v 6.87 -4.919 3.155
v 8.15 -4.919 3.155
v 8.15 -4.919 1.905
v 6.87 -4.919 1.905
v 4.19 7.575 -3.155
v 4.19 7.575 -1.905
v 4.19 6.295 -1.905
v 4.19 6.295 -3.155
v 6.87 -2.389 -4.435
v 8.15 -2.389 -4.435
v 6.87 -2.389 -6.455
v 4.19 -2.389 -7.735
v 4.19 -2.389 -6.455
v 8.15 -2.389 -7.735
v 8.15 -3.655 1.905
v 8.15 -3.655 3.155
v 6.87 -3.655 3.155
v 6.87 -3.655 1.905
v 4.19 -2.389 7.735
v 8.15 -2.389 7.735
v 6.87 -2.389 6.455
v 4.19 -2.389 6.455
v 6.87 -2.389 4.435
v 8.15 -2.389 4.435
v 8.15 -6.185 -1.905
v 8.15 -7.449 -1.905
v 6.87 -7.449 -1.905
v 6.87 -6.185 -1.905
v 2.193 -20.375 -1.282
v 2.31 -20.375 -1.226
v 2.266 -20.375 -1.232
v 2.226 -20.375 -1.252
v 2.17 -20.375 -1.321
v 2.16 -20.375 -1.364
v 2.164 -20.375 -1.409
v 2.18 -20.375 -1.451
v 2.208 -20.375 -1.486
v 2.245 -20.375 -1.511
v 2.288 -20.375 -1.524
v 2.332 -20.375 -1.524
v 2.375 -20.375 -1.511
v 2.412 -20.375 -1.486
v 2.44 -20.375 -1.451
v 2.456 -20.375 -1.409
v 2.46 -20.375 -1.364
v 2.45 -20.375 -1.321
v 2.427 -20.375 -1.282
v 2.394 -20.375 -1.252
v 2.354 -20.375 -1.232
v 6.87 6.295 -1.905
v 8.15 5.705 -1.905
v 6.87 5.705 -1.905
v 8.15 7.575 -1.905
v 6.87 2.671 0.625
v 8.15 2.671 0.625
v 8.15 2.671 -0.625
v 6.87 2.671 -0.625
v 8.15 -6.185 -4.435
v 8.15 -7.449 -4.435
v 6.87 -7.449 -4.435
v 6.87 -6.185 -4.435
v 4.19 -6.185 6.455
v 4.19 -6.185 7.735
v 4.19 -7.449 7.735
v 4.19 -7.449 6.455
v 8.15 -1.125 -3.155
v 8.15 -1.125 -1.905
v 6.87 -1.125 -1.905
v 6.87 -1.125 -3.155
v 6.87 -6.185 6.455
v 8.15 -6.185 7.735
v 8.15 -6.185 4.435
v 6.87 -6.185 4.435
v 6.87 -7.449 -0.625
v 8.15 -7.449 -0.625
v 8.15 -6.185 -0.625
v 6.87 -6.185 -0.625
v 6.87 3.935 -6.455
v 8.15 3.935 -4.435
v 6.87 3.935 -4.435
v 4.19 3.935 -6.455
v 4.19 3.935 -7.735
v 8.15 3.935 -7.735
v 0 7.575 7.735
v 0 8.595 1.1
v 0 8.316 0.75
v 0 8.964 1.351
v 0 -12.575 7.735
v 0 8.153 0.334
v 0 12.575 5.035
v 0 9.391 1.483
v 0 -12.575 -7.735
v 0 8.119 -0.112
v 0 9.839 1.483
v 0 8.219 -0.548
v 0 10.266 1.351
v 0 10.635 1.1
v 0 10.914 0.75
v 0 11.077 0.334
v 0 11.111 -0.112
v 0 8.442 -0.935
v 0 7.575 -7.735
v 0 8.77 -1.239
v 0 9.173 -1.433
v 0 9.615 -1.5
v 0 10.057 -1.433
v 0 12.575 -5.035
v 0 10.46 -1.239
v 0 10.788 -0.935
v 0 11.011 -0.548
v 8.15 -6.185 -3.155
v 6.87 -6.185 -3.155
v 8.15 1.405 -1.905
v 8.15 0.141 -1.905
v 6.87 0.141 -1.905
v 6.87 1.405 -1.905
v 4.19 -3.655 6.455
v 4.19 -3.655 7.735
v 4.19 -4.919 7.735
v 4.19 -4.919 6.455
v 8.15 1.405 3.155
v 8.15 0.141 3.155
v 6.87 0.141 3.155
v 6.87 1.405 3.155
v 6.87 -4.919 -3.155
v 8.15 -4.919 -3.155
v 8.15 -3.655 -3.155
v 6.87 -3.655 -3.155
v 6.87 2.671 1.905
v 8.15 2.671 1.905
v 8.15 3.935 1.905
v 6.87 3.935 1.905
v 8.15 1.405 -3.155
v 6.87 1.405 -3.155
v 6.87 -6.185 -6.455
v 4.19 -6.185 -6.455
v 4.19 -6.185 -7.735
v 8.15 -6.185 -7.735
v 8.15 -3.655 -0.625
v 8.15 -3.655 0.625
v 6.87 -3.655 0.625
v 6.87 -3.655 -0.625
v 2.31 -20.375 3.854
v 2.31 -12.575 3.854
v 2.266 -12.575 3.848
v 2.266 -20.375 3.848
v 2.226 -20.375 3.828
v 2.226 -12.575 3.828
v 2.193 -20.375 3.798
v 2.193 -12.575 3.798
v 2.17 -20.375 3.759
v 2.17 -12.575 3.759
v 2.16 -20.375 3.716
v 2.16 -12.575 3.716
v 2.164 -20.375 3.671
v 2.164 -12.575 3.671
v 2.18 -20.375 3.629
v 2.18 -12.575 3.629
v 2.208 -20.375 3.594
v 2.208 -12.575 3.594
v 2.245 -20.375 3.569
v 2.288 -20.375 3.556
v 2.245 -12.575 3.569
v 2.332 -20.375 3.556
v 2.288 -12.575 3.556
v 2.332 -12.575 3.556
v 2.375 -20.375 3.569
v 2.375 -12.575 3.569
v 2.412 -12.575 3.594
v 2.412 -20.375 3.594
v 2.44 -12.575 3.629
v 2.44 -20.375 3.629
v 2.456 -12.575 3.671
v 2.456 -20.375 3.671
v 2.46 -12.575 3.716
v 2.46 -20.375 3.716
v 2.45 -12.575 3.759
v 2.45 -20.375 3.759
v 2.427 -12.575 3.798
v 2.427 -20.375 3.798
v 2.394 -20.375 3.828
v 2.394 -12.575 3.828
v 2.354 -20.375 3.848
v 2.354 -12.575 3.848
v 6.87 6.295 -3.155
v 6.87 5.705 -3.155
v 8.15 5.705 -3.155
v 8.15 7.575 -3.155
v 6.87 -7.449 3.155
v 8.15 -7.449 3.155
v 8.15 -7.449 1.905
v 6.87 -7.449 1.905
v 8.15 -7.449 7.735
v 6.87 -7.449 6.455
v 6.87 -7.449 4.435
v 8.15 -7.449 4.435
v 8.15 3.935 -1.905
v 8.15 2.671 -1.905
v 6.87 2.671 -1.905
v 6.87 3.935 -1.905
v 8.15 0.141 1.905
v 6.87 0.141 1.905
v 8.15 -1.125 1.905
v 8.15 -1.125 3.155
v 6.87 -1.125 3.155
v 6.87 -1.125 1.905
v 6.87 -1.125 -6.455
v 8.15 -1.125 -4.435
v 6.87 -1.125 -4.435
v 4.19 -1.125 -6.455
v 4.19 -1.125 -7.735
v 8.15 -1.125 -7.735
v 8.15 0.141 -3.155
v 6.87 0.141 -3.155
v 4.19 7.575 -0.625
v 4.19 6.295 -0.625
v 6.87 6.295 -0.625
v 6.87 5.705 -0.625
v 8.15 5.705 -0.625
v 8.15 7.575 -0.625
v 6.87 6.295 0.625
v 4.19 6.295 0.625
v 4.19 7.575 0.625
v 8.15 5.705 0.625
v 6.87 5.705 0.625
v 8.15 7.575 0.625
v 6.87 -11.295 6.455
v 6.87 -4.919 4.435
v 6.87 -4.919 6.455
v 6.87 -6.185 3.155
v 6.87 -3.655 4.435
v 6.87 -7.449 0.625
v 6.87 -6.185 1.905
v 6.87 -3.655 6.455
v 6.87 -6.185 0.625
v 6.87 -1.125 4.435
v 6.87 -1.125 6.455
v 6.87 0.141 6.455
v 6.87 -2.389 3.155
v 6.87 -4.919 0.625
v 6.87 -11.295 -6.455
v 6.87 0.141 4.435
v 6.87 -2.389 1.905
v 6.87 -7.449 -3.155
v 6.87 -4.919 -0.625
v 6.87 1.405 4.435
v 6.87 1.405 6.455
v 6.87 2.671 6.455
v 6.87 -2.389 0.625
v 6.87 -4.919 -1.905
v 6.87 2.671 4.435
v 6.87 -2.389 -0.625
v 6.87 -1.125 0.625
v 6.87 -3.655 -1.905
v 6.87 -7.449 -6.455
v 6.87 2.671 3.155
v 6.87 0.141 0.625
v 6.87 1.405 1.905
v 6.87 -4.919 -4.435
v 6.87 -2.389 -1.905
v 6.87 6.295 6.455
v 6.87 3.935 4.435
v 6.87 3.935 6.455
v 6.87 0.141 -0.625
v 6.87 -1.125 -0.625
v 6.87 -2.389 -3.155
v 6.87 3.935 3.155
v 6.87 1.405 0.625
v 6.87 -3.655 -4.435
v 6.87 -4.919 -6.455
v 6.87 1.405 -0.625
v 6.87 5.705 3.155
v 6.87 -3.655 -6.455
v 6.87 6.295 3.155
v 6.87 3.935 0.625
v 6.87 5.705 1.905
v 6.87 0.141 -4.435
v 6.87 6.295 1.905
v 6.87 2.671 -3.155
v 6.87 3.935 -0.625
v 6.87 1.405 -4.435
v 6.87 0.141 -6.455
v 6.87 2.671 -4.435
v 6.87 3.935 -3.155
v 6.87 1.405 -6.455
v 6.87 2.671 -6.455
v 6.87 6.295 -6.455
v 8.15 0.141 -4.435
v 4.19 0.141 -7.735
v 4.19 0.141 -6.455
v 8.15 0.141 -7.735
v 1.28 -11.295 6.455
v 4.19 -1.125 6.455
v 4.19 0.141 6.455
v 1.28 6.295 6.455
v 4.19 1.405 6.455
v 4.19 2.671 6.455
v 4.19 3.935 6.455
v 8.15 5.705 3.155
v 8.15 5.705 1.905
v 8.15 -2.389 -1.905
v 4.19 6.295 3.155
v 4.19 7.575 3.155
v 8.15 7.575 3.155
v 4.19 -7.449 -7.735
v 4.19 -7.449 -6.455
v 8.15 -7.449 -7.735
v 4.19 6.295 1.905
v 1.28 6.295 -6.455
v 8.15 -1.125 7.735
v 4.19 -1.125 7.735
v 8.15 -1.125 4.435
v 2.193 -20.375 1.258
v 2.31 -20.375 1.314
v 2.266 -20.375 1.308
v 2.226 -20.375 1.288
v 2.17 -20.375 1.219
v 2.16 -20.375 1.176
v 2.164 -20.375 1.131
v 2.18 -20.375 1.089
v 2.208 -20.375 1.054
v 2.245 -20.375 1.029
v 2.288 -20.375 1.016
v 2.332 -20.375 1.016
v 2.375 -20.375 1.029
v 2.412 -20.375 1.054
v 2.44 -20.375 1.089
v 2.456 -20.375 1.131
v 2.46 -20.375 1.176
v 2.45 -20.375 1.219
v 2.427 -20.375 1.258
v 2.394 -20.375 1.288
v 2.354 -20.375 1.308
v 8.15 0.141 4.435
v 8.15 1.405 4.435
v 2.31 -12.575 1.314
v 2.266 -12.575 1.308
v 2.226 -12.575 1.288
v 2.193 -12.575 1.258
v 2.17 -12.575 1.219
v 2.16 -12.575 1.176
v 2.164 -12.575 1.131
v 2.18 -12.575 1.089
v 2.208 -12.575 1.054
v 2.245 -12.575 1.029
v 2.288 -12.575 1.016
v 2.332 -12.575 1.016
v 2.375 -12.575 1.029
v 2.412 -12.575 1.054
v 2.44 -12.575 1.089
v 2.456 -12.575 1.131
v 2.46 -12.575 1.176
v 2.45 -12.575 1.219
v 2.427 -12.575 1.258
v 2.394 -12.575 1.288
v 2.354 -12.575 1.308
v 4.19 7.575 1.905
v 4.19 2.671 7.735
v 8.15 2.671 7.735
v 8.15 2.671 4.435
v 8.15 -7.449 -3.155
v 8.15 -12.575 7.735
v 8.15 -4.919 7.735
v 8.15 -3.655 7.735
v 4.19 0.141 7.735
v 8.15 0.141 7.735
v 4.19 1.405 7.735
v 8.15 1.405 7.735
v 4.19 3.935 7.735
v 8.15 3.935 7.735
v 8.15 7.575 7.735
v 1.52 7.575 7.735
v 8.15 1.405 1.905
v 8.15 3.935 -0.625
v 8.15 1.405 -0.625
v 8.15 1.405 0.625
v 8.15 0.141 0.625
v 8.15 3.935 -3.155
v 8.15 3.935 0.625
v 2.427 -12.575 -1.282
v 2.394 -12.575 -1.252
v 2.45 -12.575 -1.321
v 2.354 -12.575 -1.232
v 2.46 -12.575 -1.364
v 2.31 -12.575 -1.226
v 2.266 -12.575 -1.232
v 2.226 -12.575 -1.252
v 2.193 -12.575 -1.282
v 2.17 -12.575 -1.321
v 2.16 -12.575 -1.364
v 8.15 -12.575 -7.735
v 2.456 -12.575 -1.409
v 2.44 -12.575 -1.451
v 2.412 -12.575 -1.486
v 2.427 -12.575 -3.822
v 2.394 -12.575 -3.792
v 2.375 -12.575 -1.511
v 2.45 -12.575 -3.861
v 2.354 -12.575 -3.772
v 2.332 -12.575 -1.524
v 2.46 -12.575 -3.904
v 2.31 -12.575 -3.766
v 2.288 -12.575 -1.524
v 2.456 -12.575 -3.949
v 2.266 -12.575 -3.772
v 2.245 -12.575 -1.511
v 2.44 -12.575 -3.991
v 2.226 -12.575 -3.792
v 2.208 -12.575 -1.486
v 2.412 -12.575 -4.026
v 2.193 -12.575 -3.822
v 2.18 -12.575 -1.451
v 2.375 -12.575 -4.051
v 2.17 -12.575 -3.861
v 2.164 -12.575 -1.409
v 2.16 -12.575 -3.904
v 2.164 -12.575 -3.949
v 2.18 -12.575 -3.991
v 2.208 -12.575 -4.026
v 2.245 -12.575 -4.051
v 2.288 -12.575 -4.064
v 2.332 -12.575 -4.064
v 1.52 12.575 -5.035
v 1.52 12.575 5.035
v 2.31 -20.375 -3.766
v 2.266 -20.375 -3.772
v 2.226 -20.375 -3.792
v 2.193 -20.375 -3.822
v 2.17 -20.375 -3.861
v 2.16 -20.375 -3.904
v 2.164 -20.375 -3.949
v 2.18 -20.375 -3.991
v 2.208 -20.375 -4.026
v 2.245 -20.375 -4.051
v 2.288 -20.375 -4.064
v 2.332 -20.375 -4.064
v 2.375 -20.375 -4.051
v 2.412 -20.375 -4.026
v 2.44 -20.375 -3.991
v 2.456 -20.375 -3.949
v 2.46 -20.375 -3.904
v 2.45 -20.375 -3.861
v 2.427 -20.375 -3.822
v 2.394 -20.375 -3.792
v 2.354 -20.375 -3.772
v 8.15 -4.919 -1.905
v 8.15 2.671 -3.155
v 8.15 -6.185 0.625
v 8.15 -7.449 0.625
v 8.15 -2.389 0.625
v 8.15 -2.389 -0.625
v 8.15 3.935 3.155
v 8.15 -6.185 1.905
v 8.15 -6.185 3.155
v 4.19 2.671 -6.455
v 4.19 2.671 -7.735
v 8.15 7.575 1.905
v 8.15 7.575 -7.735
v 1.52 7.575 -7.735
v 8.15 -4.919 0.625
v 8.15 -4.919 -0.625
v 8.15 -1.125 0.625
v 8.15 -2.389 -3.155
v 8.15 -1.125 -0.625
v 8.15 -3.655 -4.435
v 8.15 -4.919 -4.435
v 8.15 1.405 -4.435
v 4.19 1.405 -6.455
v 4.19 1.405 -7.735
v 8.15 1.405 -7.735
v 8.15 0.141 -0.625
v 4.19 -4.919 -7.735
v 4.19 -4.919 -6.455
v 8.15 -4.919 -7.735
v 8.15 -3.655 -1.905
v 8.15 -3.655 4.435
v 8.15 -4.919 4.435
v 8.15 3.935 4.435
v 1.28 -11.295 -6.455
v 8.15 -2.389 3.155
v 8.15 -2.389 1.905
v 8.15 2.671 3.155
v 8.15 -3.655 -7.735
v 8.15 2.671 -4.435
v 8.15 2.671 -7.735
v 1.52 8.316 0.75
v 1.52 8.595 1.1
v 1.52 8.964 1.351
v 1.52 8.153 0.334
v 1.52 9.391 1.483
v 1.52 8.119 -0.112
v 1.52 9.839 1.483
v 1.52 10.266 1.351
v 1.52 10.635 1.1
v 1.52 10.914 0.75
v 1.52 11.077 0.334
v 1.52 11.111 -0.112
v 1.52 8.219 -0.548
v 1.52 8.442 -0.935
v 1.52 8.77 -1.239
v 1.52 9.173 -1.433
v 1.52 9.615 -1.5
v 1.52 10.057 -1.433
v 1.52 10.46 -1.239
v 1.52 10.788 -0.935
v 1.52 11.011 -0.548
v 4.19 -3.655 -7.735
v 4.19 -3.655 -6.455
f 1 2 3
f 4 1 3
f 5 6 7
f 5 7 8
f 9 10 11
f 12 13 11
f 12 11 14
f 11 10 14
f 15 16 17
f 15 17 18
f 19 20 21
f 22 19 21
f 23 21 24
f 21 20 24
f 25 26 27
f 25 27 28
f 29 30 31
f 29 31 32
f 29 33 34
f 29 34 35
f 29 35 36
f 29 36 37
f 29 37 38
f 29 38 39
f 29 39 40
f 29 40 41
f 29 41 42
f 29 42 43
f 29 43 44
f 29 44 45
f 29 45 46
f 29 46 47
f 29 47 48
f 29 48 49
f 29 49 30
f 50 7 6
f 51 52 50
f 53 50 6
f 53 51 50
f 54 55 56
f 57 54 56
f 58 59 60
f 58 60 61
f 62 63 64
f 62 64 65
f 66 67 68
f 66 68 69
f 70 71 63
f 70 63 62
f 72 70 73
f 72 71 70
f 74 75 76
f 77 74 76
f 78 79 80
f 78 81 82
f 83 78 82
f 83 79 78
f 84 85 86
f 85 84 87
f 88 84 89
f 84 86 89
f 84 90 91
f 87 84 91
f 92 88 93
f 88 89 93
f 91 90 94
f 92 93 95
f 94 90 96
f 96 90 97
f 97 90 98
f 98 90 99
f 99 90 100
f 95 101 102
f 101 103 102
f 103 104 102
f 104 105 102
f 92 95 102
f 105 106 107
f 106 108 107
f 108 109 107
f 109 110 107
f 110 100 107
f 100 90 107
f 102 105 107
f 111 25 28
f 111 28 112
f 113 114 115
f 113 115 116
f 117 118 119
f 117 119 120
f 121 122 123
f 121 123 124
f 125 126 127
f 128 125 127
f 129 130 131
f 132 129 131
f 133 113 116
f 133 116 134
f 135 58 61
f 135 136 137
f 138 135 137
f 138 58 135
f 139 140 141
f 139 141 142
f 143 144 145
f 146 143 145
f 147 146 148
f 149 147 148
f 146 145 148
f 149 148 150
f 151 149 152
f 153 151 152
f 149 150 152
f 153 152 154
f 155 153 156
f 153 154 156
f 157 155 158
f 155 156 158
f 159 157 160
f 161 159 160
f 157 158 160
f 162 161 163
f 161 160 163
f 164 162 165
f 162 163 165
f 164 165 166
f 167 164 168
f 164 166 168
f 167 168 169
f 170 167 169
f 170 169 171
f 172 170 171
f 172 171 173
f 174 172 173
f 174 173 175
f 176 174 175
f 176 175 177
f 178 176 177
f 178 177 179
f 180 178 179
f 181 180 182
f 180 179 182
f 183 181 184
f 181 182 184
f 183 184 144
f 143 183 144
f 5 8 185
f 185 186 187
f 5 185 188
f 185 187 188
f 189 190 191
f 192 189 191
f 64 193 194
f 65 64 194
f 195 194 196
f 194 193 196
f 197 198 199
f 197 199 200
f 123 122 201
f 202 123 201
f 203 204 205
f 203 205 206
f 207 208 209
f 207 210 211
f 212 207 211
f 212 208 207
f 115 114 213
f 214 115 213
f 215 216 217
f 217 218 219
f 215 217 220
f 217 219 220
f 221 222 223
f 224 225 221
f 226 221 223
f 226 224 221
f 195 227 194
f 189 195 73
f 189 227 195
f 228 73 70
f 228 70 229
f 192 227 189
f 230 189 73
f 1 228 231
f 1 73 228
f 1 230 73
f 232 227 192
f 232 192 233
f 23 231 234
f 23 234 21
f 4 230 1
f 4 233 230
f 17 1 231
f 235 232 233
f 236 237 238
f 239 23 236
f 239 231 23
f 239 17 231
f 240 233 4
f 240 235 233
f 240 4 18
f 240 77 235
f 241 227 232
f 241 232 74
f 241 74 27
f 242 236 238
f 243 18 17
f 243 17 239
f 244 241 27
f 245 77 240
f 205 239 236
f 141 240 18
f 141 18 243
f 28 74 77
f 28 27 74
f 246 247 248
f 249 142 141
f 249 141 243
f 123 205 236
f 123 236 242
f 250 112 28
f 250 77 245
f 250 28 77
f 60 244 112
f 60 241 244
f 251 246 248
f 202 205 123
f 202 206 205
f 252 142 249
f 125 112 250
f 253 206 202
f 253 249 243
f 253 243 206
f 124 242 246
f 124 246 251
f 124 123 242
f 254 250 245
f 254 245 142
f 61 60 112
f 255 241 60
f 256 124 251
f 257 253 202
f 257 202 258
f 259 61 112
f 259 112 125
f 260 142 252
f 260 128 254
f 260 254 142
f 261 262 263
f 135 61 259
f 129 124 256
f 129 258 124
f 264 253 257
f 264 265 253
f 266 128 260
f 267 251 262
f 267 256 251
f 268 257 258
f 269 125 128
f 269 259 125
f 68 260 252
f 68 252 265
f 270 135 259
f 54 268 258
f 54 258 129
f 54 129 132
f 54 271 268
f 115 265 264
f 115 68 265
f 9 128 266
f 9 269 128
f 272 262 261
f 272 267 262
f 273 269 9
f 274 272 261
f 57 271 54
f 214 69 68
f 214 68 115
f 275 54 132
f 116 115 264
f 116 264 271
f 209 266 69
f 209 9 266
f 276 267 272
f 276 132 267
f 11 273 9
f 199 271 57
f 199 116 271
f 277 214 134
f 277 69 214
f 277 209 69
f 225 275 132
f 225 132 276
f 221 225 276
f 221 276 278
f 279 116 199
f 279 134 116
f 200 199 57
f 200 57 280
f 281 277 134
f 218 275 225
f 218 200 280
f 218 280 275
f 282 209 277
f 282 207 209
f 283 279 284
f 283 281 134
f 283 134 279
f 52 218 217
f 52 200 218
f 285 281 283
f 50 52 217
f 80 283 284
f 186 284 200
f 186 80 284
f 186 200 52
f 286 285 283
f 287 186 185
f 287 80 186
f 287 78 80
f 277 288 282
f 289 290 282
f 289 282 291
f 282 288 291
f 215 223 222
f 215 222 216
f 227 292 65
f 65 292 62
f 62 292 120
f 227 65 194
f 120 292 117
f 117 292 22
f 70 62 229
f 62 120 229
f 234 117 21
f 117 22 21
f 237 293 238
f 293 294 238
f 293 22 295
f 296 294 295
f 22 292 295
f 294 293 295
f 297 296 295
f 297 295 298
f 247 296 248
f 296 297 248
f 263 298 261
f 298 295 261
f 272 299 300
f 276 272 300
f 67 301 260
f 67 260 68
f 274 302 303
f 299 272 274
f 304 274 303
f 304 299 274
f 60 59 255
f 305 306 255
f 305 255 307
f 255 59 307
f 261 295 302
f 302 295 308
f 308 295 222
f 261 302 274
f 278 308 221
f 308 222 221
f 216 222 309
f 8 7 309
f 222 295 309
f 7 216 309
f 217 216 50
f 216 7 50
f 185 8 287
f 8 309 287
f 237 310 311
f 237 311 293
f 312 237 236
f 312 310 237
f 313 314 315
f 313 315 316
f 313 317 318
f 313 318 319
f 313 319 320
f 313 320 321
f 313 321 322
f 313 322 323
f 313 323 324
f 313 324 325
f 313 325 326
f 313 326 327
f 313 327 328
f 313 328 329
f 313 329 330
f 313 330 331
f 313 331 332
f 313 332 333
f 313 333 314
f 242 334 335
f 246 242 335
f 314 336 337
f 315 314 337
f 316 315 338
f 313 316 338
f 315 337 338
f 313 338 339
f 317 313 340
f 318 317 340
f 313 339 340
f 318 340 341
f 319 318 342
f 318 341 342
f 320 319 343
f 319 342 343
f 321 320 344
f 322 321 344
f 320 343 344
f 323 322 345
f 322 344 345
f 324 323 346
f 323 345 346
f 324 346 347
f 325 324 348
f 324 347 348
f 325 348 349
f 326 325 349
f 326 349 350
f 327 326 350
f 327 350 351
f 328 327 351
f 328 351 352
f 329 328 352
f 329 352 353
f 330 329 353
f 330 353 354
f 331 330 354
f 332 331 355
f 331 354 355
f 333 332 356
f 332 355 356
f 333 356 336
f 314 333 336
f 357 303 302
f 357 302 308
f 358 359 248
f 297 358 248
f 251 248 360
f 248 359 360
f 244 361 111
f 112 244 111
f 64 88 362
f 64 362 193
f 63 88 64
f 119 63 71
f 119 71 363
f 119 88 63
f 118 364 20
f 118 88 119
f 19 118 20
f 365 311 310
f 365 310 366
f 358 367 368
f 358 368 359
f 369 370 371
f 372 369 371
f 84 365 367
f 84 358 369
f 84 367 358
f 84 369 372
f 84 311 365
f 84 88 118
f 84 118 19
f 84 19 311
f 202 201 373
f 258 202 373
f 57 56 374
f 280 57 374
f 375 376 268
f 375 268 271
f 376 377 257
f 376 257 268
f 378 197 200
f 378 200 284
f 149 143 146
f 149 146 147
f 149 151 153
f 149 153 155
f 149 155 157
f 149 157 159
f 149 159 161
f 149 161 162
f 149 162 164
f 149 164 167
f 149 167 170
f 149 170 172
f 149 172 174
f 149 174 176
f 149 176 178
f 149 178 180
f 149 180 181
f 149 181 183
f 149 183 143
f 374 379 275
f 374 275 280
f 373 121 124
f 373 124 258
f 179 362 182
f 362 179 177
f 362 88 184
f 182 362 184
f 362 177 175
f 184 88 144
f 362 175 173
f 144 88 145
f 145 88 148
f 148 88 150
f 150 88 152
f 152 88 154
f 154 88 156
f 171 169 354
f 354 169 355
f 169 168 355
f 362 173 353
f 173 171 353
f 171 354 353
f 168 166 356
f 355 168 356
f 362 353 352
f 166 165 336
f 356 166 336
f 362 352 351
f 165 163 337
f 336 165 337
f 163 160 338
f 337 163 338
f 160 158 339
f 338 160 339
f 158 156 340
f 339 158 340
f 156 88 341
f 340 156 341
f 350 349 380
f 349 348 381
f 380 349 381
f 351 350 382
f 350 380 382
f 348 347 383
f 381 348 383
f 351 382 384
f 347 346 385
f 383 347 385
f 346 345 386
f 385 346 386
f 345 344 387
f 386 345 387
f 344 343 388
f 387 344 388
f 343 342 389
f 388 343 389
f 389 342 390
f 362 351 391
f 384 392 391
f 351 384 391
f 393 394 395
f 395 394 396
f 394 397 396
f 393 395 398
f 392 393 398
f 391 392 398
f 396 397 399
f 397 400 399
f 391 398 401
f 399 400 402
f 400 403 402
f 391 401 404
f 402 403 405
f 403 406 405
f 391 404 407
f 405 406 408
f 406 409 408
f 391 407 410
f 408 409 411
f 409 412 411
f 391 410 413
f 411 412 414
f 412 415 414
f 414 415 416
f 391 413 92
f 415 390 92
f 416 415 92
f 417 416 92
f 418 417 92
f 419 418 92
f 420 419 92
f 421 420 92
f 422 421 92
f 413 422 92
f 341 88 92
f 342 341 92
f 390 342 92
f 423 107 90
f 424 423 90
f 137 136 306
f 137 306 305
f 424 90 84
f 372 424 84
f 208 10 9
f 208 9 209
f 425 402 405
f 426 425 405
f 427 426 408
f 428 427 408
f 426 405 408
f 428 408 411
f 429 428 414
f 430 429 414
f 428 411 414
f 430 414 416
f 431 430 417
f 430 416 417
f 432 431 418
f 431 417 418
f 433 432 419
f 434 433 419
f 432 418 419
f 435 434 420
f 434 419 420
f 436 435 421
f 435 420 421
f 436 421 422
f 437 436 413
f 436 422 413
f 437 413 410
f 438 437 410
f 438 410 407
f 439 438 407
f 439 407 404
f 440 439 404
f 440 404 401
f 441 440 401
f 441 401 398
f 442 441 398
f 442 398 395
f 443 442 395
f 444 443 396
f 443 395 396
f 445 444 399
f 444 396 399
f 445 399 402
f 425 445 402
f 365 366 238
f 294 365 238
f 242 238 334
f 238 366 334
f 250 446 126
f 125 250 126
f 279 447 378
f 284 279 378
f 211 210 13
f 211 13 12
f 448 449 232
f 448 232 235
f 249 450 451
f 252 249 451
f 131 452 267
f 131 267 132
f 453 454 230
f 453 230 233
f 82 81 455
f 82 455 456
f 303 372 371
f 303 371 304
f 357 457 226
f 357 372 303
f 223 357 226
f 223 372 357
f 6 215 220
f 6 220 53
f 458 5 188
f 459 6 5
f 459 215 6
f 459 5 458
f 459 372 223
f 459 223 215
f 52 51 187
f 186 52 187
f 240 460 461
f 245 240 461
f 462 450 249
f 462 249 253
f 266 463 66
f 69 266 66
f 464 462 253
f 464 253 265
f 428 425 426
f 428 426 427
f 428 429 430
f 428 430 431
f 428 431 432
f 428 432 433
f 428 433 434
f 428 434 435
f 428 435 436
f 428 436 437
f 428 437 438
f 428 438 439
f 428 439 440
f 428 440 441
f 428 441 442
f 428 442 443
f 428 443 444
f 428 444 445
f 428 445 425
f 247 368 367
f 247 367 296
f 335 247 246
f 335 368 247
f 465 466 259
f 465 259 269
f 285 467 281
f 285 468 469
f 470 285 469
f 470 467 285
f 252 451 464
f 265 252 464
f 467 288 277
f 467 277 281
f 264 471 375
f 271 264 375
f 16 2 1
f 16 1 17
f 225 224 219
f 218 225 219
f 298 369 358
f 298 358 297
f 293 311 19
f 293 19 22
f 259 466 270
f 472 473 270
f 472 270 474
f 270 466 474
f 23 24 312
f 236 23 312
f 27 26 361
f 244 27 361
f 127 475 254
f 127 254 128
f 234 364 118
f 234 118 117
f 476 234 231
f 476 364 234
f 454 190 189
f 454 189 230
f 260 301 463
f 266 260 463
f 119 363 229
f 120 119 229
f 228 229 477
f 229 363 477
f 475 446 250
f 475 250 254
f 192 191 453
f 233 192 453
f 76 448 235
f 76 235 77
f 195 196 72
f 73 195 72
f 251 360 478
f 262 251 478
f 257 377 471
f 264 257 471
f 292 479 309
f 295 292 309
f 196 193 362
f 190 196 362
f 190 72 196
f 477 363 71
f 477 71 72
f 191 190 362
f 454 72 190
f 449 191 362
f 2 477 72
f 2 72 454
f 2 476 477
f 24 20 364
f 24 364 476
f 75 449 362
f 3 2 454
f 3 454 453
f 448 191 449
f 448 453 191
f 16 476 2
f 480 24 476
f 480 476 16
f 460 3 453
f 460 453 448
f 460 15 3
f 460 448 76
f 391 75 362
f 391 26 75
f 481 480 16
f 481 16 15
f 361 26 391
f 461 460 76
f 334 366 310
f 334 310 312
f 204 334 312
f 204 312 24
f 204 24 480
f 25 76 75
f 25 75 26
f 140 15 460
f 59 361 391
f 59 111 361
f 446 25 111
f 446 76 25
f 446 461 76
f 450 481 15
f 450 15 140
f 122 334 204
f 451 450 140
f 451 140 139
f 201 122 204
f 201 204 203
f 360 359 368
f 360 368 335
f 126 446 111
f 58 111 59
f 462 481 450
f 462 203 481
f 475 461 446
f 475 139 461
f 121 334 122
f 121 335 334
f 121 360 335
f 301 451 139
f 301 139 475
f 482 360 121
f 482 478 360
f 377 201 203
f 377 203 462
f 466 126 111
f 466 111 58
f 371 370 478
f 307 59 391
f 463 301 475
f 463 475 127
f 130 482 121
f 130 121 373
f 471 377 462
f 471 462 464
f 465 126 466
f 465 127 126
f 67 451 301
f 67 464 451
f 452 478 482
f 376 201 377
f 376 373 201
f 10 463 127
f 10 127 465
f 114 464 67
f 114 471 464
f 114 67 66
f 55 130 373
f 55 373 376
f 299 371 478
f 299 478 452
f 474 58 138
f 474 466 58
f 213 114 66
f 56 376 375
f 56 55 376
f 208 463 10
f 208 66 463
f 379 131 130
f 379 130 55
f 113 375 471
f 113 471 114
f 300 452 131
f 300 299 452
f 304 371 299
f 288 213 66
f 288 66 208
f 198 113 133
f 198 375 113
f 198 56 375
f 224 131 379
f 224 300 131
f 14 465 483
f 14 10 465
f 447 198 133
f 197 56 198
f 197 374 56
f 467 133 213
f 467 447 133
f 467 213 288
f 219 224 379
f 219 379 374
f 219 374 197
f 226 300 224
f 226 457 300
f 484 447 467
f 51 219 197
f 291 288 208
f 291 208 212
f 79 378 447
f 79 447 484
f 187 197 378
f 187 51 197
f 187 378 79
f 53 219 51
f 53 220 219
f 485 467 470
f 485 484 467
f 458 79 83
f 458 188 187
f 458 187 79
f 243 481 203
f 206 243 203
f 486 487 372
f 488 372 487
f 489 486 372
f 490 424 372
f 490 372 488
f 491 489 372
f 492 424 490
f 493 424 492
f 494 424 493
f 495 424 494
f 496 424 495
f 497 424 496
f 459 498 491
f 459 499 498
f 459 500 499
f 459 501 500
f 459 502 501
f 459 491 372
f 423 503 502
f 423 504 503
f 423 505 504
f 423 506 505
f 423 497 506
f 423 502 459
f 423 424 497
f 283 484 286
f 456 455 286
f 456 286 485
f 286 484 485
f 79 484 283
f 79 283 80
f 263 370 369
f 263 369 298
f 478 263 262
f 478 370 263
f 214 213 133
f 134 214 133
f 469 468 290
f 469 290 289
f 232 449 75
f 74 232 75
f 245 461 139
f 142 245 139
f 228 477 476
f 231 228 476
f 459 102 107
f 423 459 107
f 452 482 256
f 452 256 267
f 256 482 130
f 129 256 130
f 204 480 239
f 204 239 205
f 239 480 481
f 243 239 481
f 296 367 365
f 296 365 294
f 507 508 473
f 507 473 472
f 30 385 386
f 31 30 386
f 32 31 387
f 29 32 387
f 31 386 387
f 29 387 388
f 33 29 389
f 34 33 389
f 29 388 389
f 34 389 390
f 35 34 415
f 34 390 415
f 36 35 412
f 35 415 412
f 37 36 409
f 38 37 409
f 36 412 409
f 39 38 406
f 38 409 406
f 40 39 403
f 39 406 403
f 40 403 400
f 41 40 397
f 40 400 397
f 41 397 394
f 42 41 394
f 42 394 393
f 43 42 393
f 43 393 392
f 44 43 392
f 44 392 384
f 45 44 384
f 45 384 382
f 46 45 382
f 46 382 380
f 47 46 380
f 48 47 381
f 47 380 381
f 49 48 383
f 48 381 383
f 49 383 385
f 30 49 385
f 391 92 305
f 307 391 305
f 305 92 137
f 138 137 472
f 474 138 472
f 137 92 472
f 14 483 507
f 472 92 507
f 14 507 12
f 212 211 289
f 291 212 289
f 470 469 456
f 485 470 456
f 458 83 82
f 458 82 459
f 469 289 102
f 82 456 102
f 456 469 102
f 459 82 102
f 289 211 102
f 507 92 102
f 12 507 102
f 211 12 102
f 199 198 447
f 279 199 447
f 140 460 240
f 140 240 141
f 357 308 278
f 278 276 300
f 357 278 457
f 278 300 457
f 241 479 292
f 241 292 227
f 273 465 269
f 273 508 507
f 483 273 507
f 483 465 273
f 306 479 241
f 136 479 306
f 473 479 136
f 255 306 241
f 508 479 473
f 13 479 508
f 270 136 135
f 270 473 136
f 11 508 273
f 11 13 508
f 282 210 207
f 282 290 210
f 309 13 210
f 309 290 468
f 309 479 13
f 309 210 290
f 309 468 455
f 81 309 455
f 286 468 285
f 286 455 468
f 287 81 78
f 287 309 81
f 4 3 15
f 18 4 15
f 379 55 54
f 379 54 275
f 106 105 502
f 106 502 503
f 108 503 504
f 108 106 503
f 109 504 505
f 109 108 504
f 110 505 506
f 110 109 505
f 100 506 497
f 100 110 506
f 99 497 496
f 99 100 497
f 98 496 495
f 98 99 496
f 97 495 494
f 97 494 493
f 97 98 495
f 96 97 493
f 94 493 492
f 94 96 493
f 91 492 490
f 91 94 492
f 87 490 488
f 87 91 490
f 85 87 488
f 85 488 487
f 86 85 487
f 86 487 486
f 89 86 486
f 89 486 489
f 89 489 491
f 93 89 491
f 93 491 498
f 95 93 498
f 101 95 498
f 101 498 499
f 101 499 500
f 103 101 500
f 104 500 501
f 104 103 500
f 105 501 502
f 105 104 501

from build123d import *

# Parameters (mm, degrees)
SKETCH1_W           = 15.47
SKETCH1_H           = 20.15
BOSS_EXTRUDE1_DEPTH = 8.15
SKETCH1_4_R         = 1.5
SKETCH1_4_W         = 15.47
SKETCH1_4_H         = 20.15
BOSS_EXTRUDE2_DEPTH = 1.52
SHELL1_START        = -6.455
SHELL1_OUTLINE_W    = 5.59
SHELL1_OUTLINE_H    = 17.59
SHELL1_DEPTH        = 12.91
SKETCH2_W           = 1.25
SKETCH2_H           = 1.87
SKETCH2_H_2         = 1.264229858
SKETCH2_W_2         = 3.3
CUT_EXTRUDE1_DEPTH  = 3.96
SKETCH3_R           = 0.15
BOSS_EXTRUDE3_DEPTH = 7.8


# Read off the part's stored shape, not the designer's step: Shell1
with BuildPart() as part:
    # Sketch1 → Boss-Extrude1 (new body)
    with BuildSketch(Plane(origin=(0, 0, 0), x_dir=(0, 0, -1), z_dir=(1, 0, 0))):
        with Locations((0, -2.5)):
            Rectangle(SKETCH1_W, SKETCH1_H)
    extrude(amount=BOSS_EXTRUDE1_DEPTH)

    # Sketch1<4> → Boss-Extrude2 (add)
    # profile 1 of 2: a face of its own
    with BuildSketch(Plane(origin=(0, 0, 0), x_dir=(0, 0, -1), z_dir=(1, 0, 0))):
        Polygon((-5.035, 12.575), (-7.735, 7.575), (7.735, 7.575), (5.035, 12.575), align=None)
        with Locations((0, 9.615)):
            Circle(SKETCH1_4_R, mode=Mode.SUBTRACT)
    # profile 2 of 2: a face of its own
    with BuildSketch(Plane(origin=(0, 0, 0), x_dir=(0, 0, -1), z_dir=(1, 0, 0))):
        with Locations((0, -2.5)):
            Rectangle(SKETCH1_4_W, SKETCH1_4_H)
    extrude(amount=BOSS_EXTRUDE2_DEPTH)

    # Shell1 outline → Shell1 (cut)
    with BuildSketch(Plane.XY.offset(SHELL1_START)):
        with Locations((4.075, -2.5)):
            Rectangle(SHELL1_OUTLINE_W, SHELL1_OUTLINE_H)
    extrude(amount=SHELL1_DEPTH, mode=Mode.SUBTRACT)

    # Sketch2 → Cut-Extrude1 (cut)
    with BuildSketch(Plane(origin=(8.15, 0, 0), x_dir=(0, 0, -1), z_dir=(1, 0, 0))):
        with Locations((0, 6.64)):
            Rectangle(SKETCH2_W, SKETCH2_H)
        with Locations((2.53, 6.64)):
            Rectangle(SKETCH2_W, SKETCH2_H)
        with Locations((2.53, 0.772885071)):
            Rectangle(SKETCH2_W, SKETCH2_H_2)
        with Locations((6.085, 0.772885071)):
            Rectangle(SKETCH2_W_2, SKETCH2_H_2)
        with Locations((6.085, 3.302885071)):
            Rectangle(SKETCH2_W_2, SKETCH2_H_2)
        with Locations((0, 3.302885071)):
            Rectangle(SKETCH2_W, SKETCH2_H_2)
        with Locations((-2.53, 0.772885071)):
            Rectangle(SKETCH2_W, SKETCH2_H_2)
        with Locations((-2.53, 3.302885071)):
            Rectangle(SKETCH2_W, SKETCH2_H_2)
        with Locations((-6.085, 3.302885071)):
            Rectangle(SKETCH2_W_2, SKETCH2_H_2)
        with Locations((-6.085, 0.772885071)):
            Rectangle(SKETCH2_W_2, SKETCH2_H_2)
        with Locations((-6.085, -1.757114929)):
            Rectangle(SKETCH2_W_2, SKETCH2_H_2)
        with Locations((-6.085, -4.287114929)):
            Rectangle(SKETCH2_W_2, SKETCH2_H_2)
        with Locations((-2.53, -1.757114929)):
            Rectangle(SKETCH2_W, SKETCH2_H_2)
        with Locations((0, -1.757114929)):
            Rectangle(SKETCH2_W, SKETCH2_H_2)
        with Locations((2.53, -1.757114929)):
            Rectangle(SKETCH2_W, SKETCH2_H_2)
        with Locations((6.085, -1.757114929)):
            Rectangle(SKETCH2_W_2, SKETCH2_H_2)
        with Locations((6.085, -4.287114929)):
            Rectangle(SKETCH2_W_2, SKETCH2_H_2)
        with Locations((2.53, -4.287114929)):
            Rectangle(SKETCH2_W, SKETCH2_H_2)
        with Locations((0, -4.287114929)):
            Rectangle(SKETCH2_W, SKETCH2_H_2)
        with Locations((-2.53, -4.287114929)):
            Rectangle(SKETCH2_W, SKETCH2_H_2)
        with Locations((6.085, -6.817114929)):
            Rectangle(SKETCH2_W_2, SKETCH2_H_2)
        with Locations((2.53, -6.817114929)):
            Rectangle(SKETCH2_W, SKETCH2_H_2)
        with Locations((-2.53, -6.817114929)):
            Rectangle(SKETCH2_W, SKETCH2_H_2)
        with Locations((-6.085, -6.817114929)):
            Rectangle(SKETCH2_W_2, SKETCH2_H_2)
        with Locations((-2.53, 6.64)):
            Rectangle(SKETCH2_W, SKETCH2_H)
        with Locations((2.53, 3.302885071)):
            Rectangle(SKETCH2_W, SKETCH2_H_2)
        with Locations((0, 0.772885071)):
            Rectangle(SKETCH2_W, SKETCH2_H_2)
        with Locations((0, -6.817114929)):
            Rectangle(SKETCH2_W, SKETCH2_H_2)
    extrude(amount=-CUT_EXTRUDE1_DEPTH, mode=Mode.SUBTRACT)

    # Sketch3 → Boss-Extrude3 (add)
    with BuildSketch(Plane.XZ.offset(12.575)):
        with Locations(Location((2.31, 3.704312159, 0), (0, 0, 90))):
            Circle(SKETCH3_R)
        with Locations(Location((2.31, 1.164312159, 0), (0, 0, 90))):
            Circle(SKETCH3_R)
        with Locations(Location((2.31, -1.375687841, 0), (0, 0, 90))):
            Circle(SKETCH3_R)
        with Locations(Location((2.31, -3.915687841, 0), (0, 0, 90))):
            Circle(SKETCH3_R)
    extrude(amount=BOSS_EXTRUDE3_DEPTH)


solid = part.part
